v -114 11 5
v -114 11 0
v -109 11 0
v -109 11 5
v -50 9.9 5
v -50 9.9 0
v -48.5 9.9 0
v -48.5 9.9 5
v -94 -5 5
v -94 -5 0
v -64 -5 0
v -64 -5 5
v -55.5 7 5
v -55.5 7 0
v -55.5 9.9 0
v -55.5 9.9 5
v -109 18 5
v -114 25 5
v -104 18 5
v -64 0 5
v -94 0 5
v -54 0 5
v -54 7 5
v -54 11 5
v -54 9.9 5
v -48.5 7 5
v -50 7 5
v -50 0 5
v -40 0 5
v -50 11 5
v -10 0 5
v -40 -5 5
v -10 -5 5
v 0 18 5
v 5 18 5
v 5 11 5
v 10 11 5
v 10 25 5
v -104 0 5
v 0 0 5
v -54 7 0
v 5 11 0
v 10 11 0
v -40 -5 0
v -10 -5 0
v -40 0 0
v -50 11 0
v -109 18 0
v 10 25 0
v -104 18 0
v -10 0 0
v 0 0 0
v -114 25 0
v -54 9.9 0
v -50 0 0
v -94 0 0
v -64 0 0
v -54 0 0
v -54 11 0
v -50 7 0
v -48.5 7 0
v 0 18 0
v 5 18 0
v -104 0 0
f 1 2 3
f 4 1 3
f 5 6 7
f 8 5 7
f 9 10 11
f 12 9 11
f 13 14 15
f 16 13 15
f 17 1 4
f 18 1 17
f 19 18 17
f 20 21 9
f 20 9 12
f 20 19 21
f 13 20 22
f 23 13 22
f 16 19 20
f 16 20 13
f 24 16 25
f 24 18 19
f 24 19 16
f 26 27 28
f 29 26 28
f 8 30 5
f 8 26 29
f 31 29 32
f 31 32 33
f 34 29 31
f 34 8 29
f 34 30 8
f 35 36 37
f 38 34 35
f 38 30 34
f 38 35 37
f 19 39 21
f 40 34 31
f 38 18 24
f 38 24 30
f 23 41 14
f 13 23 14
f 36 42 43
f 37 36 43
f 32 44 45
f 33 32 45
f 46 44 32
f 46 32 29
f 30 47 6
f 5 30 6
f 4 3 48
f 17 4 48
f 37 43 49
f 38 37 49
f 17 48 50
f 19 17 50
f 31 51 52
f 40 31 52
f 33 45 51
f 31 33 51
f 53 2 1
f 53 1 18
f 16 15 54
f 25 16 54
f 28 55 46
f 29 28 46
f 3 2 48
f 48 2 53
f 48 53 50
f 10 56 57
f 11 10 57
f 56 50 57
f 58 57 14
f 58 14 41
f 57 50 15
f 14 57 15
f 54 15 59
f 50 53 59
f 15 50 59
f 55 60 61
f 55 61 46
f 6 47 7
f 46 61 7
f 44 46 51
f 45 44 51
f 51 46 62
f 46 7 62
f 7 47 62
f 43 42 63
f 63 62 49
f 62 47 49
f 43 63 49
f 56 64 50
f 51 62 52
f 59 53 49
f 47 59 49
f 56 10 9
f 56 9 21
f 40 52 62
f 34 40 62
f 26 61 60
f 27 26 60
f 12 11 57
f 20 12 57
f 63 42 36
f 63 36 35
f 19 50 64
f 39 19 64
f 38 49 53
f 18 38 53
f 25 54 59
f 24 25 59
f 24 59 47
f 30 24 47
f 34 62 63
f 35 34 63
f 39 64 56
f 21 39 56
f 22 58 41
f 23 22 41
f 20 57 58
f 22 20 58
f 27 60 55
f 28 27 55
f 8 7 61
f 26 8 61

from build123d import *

# Parameters (mm, degrees)
SKETCH_1_W      = 5
SKETCH_1_H      = 7
SKETCH_1_H_2    = 14
SKETCH_1_W_2    = 30
SKETCH_1_H_3    = 5
EXTRUDE_2_DEPTH = 5


with BuildPart() as part:
    # 草图1 → 凸台-拉伸2 (new body)
    with BuildSketch(Plane.XY):
        with Locations((-106.5, 21.5)):
            Rectangle(SKETCH_1_W, SKETCH_1_H)
        with Locations((-111.5, 18)):
            Rectangle(SKETCH_1_W, SKETCH_1_H_2)
        Polygon((-64, 0), (-54, 0), (-54, 7), (-55.5, 7), (-55.5, 9.9), (-54, 9.9), (-54, 11), (-52, 11), (-52, 25), (-104, 25), (-104, 18), (-104, 0), (-94, 0), align=None)
        Polygon((-50, 7), (-50, 0), (-40, 0), (-10, 0), (0, 0), (0, 18), (0, 25), (-52, 25), (-52, 11), (-50, 11), (-50, 9.9), (-48.5, 9.9), (-48.5, 7), align=None)
        with Locations((7.5, 18)):
            Rectangle(SKETCH_1_W, SKETCH_1_H_2)
        with Locations((2.5, 21.5)):
            Rectangle(SKETCH_1_W, SKETCH_1_H)
        with Locations((-25, -2.5)):
            Rectangle(SKETCH_1_W_2, SKETCH_1_H_3)
        with Locations((-79, -2.5)):
            Rectangle(SKETCH_1_W_2, SKETCH_1_H_3)
    extrude(amount=EXTRUDE_2_DEPTH)


solid = part.part
